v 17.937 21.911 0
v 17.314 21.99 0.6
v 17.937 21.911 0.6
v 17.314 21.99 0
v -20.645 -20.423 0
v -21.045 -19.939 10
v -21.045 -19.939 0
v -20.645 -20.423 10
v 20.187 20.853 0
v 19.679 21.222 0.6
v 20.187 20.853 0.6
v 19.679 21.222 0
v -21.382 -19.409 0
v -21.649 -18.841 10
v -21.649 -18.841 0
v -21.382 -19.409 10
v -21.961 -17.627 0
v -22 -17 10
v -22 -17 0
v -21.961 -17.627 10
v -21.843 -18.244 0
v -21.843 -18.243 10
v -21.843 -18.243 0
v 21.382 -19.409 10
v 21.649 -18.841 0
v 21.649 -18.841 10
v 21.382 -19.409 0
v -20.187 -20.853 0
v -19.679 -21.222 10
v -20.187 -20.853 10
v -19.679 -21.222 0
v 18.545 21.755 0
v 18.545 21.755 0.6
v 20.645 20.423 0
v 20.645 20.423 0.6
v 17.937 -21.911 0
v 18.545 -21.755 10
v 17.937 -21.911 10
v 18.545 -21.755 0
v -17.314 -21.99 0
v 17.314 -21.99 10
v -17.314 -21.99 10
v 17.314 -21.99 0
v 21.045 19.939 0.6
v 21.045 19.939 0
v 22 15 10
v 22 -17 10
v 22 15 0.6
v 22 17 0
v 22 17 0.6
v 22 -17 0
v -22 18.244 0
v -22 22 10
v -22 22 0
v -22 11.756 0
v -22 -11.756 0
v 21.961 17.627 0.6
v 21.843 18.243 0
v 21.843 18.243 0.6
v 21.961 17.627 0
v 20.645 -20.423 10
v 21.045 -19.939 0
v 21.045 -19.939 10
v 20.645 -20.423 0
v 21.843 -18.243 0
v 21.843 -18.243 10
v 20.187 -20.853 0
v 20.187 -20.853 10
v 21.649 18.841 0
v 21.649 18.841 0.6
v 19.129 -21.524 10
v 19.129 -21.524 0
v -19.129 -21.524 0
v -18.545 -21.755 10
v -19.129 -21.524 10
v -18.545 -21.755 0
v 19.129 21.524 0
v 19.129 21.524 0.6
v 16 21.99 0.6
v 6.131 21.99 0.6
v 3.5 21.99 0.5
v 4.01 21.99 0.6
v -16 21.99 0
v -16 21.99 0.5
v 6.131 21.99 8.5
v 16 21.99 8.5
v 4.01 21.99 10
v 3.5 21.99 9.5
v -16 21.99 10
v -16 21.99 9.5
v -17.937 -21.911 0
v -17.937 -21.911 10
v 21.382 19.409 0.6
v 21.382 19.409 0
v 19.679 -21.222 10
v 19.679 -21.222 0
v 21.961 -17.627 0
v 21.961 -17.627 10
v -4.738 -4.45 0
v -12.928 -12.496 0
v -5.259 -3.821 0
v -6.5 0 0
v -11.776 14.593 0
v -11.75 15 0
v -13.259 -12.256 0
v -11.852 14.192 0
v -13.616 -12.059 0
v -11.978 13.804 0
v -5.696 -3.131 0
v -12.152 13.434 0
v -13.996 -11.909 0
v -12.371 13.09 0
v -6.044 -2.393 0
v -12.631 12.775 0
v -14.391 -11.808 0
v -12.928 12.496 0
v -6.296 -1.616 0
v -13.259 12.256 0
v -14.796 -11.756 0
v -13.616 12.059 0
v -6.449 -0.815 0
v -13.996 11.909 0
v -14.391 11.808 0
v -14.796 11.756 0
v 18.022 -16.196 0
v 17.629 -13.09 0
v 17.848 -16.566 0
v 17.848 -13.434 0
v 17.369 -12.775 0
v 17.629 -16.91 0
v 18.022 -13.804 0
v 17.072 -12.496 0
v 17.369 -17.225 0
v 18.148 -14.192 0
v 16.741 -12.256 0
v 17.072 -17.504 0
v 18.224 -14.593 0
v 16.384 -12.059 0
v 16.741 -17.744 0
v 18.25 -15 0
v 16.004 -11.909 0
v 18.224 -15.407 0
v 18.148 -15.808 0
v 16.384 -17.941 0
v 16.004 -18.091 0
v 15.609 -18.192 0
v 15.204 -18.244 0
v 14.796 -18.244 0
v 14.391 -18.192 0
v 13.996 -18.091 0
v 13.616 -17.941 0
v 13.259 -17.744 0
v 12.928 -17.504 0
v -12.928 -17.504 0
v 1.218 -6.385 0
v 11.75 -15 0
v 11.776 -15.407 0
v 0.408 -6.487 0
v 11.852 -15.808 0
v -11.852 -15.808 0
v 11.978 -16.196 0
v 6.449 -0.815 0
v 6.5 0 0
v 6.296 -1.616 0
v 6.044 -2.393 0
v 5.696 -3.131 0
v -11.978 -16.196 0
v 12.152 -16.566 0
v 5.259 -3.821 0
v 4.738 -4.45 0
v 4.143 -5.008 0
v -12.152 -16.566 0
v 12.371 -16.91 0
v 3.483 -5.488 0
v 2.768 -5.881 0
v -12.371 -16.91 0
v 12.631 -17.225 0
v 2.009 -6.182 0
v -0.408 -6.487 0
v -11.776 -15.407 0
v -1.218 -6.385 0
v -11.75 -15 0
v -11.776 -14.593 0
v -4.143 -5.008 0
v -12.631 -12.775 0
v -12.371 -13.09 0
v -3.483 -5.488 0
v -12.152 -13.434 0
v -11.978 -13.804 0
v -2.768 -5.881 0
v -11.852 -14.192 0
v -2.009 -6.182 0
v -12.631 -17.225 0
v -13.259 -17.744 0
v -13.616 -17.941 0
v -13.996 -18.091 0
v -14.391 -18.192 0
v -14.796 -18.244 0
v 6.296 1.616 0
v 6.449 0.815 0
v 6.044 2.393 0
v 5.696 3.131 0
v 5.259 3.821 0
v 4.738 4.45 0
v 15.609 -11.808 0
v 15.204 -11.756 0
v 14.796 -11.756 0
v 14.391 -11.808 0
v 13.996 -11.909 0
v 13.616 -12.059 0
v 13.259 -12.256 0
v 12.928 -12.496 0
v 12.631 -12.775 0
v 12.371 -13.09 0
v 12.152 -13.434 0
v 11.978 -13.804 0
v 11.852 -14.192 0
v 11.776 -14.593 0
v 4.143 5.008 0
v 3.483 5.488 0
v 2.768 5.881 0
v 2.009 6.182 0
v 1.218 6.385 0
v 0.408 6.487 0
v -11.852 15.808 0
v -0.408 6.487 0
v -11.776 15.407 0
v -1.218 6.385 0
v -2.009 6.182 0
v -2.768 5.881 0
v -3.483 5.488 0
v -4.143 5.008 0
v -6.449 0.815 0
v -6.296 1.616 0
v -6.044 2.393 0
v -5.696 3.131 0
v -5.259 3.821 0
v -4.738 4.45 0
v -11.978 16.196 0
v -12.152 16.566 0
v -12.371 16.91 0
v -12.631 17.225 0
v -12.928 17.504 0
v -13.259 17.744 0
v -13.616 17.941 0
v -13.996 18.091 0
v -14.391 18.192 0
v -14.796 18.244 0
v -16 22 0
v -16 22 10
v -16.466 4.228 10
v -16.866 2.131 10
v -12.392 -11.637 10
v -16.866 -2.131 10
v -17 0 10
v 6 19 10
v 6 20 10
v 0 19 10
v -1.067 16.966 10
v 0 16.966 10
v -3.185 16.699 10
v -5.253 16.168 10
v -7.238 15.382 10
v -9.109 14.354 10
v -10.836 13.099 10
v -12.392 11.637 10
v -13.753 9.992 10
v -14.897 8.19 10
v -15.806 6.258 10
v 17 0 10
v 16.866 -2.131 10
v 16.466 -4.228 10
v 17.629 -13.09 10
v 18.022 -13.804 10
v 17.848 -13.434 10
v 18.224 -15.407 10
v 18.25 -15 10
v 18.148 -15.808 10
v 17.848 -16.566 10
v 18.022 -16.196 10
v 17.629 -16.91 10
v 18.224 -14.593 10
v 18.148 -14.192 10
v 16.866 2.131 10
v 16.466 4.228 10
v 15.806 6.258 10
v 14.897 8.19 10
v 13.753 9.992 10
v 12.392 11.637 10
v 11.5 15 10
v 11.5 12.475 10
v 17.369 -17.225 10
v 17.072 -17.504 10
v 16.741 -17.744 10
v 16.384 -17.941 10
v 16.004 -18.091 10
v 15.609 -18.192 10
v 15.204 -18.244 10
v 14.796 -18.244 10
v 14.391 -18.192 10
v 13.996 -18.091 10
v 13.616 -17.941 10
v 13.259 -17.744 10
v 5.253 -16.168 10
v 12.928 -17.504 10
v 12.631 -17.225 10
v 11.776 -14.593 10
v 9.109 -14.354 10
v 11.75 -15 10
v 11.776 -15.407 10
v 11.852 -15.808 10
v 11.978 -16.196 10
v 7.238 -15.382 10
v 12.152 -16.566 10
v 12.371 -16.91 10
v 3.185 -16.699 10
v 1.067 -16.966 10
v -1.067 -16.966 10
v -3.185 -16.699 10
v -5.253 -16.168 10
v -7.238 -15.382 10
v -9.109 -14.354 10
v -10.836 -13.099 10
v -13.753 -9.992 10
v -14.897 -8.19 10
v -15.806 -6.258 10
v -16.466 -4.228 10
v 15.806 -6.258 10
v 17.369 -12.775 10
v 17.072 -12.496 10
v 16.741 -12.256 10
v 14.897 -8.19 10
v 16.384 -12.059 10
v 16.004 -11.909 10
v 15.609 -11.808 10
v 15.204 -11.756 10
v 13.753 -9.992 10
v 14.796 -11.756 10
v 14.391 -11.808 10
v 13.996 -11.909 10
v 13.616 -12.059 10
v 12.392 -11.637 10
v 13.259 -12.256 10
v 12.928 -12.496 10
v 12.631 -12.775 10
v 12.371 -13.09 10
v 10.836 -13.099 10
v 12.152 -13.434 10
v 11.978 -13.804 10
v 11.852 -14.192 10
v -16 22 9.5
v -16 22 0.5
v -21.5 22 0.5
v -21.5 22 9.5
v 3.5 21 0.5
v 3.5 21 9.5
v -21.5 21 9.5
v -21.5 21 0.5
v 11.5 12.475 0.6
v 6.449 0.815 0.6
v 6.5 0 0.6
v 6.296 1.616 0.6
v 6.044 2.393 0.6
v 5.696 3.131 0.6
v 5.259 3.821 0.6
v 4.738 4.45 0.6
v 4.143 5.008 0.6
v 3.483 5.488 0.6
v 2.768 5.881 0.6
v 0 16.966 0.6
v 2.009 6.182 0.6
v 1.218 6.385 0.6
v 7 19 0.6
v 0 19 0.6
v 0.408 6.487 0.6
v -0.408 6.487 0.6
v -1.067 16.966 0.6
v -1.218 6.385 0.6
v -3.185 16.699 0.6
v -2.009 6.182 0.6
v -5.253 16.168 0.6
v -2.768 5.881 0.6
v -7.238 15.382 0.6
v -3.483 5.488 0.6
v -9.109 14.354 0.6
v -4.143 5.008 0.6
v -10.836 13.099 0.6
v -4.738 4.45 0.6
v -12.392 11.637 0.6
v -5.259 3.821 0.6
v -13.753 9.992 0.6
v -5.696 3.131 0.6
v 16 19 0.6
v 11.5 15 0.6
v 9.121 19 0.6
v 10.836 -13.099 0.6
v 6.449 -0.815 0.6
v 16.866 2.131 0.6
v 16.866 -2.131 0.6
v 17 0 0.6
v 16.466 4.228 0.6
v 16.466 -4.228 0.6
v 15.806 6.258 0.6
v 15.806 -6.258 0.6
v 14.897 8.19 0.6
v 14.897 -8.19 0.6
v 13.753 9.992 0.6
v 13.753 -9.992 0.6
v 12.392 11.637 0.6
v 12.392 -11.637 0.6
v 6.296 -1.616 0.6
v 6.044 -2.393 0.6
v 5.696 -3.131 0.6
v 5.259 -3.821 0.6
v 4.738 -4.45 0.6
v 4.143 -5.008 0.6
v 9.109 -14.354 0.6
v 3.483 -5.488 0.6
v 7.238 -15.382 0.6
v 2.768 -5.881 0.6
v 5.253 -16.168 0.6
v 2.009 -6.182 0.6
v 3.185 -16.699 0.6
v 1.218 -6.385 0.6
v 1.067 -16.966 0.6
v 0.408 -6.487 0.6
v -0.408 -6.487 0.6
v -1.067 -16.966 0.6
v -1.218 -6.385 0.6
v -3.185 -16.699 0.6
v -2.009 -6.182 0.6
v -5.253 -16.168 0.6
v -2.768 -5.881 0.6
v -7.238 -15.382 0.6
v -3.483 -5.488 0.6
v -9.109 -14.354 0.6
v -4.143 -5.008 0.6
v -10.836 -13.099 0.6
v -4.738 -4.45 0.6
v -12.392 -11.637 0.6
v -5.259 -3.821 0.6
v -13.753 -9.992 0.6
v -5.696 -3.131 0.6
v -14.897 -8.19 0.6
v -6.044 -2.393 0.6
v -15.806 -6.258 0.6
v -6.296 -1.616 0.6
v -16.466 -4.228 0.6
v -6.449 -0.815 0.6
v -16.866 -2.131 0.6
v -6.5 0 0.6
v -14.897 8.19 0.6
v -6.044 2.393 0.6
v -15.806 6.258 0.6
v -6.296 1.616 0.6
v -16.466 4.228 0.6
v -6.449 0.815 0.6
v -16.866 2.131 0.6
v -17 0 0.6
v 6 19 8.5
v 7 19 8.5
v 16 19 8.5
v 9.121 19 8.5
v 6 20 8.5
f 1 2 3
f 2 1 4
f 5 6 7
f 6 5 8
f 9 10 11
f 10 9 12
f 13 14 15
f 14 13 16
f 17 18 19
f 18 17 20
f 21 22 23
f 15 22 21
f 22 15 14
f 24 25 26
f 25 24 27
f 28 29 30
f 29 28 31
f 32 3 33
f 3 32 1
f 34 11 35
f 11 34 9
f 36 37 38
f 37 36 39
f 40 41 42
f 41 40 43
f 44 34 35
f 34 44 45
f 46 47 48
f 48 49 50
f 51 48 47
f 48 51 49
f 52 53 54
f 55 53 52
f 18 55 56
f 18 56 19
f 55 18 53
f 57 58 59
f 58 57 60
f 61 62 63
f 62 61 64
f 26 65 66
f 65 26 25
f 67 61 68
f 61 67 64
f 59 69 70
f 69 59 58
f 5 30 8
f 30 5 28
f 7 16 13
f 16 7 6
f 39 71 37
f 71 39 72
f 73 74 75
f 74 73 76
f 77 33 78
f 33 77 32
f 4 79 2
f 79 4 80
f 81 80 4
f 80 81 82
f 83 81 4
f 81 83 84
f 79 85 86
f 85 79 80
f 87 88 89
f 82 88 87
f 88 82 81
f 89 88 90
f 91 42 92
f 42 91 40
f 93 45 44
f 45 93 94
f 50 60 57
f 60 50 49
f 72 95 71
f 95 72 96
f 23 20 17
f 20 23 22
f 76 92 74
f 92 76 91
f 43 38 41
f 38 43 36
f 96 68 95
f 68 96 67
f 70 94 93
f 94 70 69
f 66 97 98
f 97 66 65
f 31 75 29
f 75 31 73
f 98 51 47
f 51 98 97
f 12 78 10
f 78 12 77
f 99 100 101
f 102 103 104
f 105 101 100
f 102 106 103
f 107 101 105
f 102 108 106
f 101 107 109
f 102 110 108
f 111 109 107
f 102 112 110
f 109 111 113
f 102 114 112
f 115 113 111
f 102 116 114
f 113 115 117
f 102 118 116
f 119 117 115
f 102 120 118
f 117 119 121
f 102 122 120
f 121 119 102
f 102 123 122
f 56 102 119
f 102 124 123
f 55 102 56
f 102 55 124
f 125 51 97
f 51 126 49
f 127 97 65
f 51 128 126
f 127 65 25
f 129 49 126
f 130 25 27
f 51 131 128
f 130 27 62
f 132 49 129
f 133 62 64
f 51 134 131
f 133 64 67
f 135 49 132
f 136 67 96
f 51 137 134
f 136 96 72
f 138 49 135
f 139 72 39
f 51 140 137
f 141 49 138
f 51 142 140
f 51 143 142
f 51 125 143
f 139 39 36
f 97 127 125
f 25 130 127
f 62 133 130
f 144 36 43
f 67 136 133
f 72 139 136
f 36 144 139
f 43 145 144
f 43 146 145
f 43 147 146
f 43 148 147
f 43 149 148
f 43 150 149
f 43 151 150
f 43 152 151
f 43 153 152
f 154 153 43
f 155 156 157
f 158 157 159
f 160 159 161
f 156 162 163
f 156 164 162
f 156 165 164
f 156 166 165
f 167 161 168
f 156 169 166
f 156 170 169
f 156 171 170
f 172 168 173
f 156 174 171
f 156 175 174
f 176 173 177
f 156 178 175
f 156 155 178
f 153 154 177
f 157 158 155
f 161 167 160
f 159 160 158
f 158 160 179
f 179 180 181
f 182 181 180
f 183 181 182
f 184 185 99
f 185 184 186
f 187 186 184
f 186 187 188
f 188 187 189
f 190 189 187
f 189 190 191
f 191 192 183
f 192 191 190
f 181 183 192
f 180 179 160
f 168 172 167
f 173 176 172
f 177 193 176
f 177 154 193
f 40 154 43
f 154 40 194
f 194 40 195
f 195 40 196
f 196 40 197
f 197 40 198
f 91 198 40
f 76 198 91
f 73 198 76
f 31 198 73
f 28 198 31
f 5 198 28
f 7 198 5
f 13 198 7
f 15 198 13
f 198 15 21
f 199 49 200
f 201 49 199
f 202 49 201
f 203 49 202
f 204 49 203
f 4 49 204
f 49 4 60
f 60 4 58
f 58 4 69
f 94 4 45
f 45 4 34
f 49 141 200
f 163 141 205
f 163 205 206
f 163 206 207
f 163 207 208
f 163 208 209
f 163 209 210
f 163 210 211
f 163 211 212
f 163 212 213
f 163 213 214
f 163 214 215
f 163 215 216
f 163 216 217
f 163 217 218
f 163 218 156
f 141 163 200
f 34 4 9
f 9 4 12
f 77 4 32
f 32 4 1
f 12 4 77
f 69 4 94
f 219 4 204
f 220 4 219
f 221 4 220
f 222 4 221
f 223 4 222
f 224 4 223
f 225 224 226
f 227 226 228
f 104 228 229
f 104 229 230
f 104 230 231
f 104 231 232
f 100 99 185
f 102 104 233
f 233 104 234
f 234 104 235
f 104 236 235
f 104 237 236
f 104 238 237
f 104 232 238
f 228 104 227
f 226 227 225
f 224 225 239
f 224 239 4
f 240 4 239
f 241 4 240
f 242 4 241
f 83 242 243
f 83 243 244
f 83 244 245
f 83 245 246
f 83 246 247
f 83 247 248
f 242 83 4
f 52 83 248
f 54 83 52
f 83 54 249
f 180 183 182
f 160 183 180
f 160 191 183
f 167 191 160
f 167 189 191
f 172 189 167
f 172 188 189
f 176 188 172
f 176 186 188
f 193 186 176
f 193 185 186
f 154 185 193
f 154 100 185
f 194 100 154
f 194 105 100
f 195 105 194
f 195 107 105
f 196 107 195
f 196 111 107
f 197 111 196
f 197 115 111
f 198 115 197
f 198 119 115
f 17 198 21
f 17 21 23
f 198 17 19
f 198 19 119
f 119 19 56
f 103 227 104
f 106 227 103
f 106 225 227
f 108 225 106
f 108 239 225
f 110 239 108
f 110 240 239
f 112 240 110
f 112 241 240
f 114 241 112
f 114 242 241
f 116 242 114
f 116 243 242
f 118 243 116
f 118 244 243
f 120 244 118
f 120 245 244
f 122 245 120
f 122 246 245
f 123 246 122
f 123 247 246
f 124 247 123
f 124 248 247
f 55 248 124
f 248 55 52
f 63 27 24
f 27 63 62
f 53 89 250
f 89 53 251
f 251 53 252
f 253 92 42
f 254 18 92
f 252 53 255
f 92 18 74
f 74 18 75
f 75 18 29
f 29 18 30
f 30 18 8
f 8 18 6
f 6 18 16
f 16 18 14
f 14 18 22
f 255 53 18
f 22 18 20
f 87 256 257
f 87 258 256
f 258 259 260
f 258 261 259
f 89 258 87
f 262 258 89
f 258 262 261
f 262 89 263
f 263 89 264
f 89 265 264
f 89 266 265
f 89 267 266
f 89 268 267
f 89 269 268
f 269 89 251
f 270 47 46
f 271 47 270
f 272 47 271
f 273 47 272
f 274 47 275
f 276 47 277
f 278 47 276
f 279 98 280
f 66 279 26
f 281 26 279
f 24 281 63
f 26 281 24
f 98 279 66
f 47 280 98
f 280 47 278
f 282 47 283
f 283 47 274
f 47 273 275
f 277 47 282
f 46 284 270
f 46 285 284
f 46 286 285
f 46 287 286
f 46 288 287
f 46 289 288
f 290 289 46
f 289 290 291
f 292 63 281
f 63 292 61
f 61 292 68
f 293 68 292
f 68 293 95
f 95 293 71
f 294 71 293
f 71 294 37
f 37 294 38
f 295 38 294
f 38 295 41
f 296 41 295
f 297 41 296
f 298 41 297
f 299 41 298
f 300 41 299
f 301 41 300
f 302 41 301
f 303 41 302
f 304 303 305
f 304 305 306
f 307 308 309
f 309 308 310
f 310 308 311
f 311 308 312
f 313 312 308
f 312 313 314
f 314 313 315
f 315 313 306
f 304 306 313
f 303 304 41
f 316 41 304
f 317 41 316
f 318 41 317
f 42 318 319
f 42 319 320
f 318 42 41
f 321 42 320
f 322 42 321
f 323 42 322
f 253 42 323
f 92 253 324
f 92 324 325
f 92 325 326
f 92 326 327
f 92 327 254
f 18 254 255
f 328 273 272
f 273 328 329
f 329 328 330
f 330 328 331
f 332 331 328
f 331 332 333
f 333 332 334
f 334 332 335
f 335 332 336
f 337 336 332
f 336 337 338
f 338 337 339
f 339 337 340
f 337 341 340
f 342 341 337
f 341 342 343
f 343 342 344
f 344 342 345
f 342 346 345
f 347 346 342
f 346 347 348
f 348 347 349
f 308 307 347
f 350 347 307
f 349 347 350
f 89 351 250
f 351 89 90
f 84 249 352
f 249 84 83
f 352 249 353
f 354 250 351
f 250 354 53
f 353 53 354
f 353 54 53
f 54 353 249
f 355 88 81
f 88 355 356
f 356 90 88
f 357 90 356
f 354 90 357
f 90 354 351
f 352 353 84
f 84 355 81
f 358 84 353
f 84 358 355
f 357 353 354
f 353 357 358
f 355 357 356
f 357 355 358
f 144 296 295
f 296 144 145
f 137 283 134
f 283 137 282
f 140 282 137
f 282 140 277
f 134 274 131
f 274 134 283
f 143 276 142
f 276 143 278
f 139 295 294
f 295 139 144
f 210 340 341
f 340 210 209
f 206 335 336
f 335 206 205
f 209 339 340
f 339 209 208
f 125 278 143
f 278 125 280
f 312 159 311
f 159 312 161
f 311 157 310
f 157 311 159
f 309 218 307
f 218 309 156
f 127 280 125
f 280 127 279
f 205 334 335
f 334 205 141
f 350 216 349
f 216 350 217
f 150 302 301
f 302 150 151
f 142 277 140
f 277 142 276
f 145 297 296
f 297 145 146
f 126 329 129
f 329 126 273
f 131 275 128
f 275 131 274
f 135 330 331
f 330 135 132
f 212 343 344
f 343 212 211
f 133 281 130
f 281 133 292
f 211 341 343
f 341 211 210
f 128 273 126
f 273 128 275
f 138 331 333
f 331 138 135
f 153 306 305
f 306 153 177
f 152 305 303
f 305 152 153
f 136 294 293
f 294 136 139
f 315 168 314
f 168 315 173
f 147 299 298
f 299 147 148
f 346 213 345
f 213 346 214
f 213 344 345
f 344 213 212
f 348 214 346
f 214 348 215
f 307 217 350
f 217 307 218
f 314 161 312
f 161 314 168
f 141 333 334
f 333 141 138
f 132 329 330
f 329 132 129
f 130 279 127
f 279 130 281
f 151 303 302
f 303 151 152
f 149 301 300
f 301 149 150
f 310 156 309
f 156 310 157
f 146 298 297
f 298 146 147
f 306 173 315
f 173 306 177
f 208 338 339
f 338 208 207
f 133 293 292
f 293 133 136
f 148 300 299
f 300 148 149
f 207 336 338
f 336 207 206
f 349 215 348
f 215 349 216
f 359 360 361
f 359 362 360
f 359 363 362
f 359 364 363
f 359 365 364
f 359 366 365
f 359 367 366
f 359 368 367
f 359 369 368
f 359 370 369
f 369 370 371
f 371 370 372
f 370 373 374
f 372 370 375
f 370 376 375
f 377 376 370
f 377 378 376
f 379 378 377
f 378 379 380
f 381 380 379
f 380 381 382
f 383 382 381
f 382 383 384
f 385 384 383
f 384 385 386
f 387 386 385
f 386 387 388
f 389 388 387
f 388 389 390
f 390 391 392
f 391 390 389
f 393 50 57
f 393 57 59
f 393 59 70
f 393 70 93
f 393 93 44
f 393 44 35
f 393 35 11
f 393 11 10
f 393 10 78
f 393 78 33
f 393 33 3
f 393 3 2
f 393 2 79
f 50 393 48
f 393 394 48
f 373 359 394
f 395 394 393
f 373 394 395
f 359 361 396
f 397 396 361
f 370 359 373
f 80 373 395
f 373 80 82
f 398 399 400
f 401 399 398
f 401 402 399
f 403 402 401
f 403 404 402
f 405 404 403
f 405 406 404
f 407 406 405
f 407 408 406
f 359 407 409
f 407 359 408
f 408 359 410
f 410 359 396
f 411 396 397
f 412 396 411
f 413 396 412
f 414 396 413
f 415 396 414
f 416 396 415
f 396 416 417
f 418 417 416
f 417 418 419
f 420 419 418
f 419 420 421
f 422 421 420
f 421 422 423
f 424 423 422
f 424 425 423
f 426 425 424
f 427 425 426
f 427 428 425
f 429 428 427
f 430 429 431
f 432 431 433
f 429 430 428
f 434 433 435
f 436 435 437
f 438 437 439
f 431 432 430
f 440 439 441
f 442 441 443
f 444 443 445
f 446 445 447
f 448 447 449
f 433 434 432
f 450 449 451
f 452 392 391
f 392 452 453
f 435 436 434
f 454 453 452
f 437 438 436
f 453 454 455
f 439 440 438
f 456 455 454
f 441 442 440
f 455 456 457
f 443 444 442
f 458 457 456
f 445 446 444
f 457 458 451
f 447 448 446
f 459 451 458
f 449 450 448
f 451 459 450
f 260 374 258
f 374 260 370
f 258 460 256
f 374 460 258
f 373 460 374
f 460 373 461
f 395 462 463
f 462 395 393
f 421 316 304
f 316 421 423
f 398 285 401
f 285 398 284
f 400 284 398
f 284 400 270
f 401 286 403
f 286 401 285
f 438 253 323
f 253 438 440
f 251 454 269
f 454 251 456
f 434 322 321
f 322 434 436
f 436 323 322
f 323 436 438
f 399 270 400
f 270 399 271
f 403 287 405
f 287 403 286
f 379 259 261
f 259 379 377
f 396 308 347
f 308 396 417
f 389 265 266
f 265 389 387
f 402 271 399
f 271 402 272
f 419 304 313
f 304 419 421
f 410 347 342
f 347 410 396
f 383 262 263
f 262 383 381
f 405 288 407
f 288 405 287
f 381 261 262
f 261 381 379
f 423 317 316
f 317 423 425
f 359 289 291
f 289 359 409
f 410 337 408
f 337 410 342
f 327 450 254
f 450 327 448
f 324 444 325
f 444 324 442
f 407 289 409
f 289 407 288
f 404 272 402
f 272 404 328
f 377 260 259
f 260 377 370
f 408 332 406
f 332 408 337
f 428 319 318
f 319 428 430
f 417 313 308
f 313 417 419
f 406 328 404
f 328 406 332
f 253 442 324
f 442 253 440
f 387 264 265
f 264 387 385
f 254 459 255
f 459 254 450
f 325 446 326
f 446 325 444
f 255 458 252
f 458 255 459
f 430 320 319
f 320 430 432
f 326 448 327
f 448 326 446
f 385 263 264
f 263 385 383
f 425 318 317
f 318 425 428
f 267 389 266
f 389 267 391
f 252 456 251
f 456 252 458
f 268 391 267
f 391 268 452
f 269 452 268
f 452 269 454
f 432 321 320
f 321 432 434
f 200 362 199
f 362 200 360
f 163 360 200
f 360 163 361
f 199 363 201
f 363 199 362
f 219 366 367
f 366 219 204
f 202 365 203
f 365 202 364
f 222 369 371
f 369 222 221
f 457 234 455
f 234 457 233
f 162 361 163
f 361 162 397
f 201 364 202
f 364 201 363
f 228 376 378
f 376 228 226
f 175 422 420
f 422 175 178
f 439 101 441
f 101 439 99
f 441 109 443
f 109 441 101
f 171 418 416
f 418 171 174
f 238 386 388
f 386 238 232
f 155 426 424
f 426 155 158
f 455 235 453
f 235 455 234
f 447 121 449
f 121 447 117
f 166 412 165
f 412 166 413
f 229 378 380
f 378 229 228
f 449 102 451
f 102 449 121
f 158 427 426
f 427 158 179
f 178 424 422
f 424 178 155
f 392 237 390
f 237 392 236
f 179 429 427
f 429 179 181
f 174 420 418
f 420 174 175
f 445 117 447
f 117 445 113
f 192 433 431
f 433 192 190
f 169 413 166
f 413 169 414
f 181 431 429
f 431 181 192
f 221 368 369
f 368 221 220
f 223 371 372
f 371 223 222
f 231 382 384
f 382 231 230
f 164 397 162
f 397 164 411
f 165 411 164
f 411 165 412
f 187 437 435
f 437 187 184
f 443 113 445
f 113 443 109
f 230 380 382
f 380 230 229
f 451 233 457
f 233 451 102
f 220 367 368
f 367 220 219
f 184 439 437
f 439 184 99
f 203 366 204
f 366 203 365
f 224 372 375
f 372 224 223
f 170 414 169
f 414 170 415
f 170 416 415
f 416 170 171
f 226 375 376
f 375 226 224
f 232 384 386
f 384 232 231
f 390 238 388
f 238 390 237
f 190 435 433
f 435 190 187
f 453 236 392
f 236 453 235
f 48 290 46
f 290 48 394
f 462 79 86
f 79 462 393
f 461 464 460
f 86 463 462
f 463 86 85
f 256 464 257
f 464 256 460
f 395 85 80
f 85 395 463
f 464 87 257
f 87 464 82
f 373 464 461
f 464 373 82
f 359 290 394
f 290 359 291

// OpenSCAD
$fn = 50;


difference() {
	union() {
		hull() {
			translate(v = [-17.0000000000, 17.0000000000, 0]) {
				cylinder(h = 10, r = 5);
			}
			translate(v = [17.0000000000, 17.0000000000, 0]) {
				cylinder(h = 10, r = 5);
			}
			translate(v = [-17.0000000000, -17.0000000000, 0]) {
				cylinder(h = 10, r = 5);
			}
			translate(v = [17.0000000000, -17.0000000000, 0]) {
				cylinder(h = 10, r = 5);
			}
		}
		translate(v = [-22.0000000000, 16.0000000000, 0]) {
			cube(size = [6, 6, 10]);
		}
	}
	union() {
		translate(v = [-22.5000000000, -15.0000000000, -250.0000000000]) {
			rotate(a = [0, 0, 0]) {
				difference() {
					union() {
						hull() {
							translate(v = [7.5000000000, 0, 0]) {
								cylinder(h = 250, r = 3.2500000000, r1 = 3.2500000000, r2 = 3.2500000000);
							}
							translate(v = [-7.5000000000, 0, 0]) {
								cylinder(h = 250, r = 3.2500000000, r1 = 3.2500000000, r2 = 3.2500000000);
							}
						}
					}
					union();
				}
			}
		}
		translate(v = [-22.5000000000, 15.0000000000, -250.0000000000]) {
			rotate(a = [0, 0, 0]) {
				difference() {
					union() {
						hull() {
							translate(v = [7.5000000000, 0, 0]) {
								cylinder(h = 250, r = 3.2500000000, r1 = 3.2500000000, r2 = 3.2500000000);
							}
							translate(v = [-7.5000000000, 0, 0]) {
								cylinder(h = 250, r = 3.2500000000, r1 = 3.2500000000, r2 = 3.2500000000);
							}
						}
					}
					union();
				}
			}
		}
		translate(v = [-21.5000000000, 21.0000000000, 0.5000000000]) {
			cube(size = [25, 1, 9.0000000000]);
		}
		translate(v = [15.0000000000, -15.0000000000, -50.0000000000]) {
			cylinder(h = 100, r = 3.2500000000);
		}
		translate(v = [0.0000000000, 11.0000000000, 0.6000000000]) {
			cube(size = [11, 8, 12.4000000000]);
		}
		translate(v = [0, 0, 0.6000000000]) {
			cylinder(h = 12.4000000000, r = 17.0000000000);
		}
		translate(v = [0, 0, -5.0000000000]) {
			cylinder(h = 10, r = 6.5000000000);
		}
		translate(v = [0.0000000000, 15.0000000000, 0.6000000000]) {
			cube(size = [22.0000000000, 4, 12.4000000000]);
		}
		translate(v = [16.0000000000, 15.0000000000, 0.6000000000]) {
			cube(size = [6, 7, 12.4000000000]);
		}
		translate(v = [6.0000000000, 15.0000000000, 8.5000000000]) {
			cube(size = [16, 7, 1.5000000000]);
		}
		translate(v = [3.2500000000, 22.7500000000, 0.6000000000]) {
			rotate(a = [0, 0, -45]) {
				cube(size = [7.5000000000, 1.5000000000, 12.4000000000]);
			}
		}
		translate(v = [2.5000000000, 10.0000000000, 0.6000000000]) {
			cube(size = [9.0000000000, 5, 9.4000000000]);
		}
	}
}
